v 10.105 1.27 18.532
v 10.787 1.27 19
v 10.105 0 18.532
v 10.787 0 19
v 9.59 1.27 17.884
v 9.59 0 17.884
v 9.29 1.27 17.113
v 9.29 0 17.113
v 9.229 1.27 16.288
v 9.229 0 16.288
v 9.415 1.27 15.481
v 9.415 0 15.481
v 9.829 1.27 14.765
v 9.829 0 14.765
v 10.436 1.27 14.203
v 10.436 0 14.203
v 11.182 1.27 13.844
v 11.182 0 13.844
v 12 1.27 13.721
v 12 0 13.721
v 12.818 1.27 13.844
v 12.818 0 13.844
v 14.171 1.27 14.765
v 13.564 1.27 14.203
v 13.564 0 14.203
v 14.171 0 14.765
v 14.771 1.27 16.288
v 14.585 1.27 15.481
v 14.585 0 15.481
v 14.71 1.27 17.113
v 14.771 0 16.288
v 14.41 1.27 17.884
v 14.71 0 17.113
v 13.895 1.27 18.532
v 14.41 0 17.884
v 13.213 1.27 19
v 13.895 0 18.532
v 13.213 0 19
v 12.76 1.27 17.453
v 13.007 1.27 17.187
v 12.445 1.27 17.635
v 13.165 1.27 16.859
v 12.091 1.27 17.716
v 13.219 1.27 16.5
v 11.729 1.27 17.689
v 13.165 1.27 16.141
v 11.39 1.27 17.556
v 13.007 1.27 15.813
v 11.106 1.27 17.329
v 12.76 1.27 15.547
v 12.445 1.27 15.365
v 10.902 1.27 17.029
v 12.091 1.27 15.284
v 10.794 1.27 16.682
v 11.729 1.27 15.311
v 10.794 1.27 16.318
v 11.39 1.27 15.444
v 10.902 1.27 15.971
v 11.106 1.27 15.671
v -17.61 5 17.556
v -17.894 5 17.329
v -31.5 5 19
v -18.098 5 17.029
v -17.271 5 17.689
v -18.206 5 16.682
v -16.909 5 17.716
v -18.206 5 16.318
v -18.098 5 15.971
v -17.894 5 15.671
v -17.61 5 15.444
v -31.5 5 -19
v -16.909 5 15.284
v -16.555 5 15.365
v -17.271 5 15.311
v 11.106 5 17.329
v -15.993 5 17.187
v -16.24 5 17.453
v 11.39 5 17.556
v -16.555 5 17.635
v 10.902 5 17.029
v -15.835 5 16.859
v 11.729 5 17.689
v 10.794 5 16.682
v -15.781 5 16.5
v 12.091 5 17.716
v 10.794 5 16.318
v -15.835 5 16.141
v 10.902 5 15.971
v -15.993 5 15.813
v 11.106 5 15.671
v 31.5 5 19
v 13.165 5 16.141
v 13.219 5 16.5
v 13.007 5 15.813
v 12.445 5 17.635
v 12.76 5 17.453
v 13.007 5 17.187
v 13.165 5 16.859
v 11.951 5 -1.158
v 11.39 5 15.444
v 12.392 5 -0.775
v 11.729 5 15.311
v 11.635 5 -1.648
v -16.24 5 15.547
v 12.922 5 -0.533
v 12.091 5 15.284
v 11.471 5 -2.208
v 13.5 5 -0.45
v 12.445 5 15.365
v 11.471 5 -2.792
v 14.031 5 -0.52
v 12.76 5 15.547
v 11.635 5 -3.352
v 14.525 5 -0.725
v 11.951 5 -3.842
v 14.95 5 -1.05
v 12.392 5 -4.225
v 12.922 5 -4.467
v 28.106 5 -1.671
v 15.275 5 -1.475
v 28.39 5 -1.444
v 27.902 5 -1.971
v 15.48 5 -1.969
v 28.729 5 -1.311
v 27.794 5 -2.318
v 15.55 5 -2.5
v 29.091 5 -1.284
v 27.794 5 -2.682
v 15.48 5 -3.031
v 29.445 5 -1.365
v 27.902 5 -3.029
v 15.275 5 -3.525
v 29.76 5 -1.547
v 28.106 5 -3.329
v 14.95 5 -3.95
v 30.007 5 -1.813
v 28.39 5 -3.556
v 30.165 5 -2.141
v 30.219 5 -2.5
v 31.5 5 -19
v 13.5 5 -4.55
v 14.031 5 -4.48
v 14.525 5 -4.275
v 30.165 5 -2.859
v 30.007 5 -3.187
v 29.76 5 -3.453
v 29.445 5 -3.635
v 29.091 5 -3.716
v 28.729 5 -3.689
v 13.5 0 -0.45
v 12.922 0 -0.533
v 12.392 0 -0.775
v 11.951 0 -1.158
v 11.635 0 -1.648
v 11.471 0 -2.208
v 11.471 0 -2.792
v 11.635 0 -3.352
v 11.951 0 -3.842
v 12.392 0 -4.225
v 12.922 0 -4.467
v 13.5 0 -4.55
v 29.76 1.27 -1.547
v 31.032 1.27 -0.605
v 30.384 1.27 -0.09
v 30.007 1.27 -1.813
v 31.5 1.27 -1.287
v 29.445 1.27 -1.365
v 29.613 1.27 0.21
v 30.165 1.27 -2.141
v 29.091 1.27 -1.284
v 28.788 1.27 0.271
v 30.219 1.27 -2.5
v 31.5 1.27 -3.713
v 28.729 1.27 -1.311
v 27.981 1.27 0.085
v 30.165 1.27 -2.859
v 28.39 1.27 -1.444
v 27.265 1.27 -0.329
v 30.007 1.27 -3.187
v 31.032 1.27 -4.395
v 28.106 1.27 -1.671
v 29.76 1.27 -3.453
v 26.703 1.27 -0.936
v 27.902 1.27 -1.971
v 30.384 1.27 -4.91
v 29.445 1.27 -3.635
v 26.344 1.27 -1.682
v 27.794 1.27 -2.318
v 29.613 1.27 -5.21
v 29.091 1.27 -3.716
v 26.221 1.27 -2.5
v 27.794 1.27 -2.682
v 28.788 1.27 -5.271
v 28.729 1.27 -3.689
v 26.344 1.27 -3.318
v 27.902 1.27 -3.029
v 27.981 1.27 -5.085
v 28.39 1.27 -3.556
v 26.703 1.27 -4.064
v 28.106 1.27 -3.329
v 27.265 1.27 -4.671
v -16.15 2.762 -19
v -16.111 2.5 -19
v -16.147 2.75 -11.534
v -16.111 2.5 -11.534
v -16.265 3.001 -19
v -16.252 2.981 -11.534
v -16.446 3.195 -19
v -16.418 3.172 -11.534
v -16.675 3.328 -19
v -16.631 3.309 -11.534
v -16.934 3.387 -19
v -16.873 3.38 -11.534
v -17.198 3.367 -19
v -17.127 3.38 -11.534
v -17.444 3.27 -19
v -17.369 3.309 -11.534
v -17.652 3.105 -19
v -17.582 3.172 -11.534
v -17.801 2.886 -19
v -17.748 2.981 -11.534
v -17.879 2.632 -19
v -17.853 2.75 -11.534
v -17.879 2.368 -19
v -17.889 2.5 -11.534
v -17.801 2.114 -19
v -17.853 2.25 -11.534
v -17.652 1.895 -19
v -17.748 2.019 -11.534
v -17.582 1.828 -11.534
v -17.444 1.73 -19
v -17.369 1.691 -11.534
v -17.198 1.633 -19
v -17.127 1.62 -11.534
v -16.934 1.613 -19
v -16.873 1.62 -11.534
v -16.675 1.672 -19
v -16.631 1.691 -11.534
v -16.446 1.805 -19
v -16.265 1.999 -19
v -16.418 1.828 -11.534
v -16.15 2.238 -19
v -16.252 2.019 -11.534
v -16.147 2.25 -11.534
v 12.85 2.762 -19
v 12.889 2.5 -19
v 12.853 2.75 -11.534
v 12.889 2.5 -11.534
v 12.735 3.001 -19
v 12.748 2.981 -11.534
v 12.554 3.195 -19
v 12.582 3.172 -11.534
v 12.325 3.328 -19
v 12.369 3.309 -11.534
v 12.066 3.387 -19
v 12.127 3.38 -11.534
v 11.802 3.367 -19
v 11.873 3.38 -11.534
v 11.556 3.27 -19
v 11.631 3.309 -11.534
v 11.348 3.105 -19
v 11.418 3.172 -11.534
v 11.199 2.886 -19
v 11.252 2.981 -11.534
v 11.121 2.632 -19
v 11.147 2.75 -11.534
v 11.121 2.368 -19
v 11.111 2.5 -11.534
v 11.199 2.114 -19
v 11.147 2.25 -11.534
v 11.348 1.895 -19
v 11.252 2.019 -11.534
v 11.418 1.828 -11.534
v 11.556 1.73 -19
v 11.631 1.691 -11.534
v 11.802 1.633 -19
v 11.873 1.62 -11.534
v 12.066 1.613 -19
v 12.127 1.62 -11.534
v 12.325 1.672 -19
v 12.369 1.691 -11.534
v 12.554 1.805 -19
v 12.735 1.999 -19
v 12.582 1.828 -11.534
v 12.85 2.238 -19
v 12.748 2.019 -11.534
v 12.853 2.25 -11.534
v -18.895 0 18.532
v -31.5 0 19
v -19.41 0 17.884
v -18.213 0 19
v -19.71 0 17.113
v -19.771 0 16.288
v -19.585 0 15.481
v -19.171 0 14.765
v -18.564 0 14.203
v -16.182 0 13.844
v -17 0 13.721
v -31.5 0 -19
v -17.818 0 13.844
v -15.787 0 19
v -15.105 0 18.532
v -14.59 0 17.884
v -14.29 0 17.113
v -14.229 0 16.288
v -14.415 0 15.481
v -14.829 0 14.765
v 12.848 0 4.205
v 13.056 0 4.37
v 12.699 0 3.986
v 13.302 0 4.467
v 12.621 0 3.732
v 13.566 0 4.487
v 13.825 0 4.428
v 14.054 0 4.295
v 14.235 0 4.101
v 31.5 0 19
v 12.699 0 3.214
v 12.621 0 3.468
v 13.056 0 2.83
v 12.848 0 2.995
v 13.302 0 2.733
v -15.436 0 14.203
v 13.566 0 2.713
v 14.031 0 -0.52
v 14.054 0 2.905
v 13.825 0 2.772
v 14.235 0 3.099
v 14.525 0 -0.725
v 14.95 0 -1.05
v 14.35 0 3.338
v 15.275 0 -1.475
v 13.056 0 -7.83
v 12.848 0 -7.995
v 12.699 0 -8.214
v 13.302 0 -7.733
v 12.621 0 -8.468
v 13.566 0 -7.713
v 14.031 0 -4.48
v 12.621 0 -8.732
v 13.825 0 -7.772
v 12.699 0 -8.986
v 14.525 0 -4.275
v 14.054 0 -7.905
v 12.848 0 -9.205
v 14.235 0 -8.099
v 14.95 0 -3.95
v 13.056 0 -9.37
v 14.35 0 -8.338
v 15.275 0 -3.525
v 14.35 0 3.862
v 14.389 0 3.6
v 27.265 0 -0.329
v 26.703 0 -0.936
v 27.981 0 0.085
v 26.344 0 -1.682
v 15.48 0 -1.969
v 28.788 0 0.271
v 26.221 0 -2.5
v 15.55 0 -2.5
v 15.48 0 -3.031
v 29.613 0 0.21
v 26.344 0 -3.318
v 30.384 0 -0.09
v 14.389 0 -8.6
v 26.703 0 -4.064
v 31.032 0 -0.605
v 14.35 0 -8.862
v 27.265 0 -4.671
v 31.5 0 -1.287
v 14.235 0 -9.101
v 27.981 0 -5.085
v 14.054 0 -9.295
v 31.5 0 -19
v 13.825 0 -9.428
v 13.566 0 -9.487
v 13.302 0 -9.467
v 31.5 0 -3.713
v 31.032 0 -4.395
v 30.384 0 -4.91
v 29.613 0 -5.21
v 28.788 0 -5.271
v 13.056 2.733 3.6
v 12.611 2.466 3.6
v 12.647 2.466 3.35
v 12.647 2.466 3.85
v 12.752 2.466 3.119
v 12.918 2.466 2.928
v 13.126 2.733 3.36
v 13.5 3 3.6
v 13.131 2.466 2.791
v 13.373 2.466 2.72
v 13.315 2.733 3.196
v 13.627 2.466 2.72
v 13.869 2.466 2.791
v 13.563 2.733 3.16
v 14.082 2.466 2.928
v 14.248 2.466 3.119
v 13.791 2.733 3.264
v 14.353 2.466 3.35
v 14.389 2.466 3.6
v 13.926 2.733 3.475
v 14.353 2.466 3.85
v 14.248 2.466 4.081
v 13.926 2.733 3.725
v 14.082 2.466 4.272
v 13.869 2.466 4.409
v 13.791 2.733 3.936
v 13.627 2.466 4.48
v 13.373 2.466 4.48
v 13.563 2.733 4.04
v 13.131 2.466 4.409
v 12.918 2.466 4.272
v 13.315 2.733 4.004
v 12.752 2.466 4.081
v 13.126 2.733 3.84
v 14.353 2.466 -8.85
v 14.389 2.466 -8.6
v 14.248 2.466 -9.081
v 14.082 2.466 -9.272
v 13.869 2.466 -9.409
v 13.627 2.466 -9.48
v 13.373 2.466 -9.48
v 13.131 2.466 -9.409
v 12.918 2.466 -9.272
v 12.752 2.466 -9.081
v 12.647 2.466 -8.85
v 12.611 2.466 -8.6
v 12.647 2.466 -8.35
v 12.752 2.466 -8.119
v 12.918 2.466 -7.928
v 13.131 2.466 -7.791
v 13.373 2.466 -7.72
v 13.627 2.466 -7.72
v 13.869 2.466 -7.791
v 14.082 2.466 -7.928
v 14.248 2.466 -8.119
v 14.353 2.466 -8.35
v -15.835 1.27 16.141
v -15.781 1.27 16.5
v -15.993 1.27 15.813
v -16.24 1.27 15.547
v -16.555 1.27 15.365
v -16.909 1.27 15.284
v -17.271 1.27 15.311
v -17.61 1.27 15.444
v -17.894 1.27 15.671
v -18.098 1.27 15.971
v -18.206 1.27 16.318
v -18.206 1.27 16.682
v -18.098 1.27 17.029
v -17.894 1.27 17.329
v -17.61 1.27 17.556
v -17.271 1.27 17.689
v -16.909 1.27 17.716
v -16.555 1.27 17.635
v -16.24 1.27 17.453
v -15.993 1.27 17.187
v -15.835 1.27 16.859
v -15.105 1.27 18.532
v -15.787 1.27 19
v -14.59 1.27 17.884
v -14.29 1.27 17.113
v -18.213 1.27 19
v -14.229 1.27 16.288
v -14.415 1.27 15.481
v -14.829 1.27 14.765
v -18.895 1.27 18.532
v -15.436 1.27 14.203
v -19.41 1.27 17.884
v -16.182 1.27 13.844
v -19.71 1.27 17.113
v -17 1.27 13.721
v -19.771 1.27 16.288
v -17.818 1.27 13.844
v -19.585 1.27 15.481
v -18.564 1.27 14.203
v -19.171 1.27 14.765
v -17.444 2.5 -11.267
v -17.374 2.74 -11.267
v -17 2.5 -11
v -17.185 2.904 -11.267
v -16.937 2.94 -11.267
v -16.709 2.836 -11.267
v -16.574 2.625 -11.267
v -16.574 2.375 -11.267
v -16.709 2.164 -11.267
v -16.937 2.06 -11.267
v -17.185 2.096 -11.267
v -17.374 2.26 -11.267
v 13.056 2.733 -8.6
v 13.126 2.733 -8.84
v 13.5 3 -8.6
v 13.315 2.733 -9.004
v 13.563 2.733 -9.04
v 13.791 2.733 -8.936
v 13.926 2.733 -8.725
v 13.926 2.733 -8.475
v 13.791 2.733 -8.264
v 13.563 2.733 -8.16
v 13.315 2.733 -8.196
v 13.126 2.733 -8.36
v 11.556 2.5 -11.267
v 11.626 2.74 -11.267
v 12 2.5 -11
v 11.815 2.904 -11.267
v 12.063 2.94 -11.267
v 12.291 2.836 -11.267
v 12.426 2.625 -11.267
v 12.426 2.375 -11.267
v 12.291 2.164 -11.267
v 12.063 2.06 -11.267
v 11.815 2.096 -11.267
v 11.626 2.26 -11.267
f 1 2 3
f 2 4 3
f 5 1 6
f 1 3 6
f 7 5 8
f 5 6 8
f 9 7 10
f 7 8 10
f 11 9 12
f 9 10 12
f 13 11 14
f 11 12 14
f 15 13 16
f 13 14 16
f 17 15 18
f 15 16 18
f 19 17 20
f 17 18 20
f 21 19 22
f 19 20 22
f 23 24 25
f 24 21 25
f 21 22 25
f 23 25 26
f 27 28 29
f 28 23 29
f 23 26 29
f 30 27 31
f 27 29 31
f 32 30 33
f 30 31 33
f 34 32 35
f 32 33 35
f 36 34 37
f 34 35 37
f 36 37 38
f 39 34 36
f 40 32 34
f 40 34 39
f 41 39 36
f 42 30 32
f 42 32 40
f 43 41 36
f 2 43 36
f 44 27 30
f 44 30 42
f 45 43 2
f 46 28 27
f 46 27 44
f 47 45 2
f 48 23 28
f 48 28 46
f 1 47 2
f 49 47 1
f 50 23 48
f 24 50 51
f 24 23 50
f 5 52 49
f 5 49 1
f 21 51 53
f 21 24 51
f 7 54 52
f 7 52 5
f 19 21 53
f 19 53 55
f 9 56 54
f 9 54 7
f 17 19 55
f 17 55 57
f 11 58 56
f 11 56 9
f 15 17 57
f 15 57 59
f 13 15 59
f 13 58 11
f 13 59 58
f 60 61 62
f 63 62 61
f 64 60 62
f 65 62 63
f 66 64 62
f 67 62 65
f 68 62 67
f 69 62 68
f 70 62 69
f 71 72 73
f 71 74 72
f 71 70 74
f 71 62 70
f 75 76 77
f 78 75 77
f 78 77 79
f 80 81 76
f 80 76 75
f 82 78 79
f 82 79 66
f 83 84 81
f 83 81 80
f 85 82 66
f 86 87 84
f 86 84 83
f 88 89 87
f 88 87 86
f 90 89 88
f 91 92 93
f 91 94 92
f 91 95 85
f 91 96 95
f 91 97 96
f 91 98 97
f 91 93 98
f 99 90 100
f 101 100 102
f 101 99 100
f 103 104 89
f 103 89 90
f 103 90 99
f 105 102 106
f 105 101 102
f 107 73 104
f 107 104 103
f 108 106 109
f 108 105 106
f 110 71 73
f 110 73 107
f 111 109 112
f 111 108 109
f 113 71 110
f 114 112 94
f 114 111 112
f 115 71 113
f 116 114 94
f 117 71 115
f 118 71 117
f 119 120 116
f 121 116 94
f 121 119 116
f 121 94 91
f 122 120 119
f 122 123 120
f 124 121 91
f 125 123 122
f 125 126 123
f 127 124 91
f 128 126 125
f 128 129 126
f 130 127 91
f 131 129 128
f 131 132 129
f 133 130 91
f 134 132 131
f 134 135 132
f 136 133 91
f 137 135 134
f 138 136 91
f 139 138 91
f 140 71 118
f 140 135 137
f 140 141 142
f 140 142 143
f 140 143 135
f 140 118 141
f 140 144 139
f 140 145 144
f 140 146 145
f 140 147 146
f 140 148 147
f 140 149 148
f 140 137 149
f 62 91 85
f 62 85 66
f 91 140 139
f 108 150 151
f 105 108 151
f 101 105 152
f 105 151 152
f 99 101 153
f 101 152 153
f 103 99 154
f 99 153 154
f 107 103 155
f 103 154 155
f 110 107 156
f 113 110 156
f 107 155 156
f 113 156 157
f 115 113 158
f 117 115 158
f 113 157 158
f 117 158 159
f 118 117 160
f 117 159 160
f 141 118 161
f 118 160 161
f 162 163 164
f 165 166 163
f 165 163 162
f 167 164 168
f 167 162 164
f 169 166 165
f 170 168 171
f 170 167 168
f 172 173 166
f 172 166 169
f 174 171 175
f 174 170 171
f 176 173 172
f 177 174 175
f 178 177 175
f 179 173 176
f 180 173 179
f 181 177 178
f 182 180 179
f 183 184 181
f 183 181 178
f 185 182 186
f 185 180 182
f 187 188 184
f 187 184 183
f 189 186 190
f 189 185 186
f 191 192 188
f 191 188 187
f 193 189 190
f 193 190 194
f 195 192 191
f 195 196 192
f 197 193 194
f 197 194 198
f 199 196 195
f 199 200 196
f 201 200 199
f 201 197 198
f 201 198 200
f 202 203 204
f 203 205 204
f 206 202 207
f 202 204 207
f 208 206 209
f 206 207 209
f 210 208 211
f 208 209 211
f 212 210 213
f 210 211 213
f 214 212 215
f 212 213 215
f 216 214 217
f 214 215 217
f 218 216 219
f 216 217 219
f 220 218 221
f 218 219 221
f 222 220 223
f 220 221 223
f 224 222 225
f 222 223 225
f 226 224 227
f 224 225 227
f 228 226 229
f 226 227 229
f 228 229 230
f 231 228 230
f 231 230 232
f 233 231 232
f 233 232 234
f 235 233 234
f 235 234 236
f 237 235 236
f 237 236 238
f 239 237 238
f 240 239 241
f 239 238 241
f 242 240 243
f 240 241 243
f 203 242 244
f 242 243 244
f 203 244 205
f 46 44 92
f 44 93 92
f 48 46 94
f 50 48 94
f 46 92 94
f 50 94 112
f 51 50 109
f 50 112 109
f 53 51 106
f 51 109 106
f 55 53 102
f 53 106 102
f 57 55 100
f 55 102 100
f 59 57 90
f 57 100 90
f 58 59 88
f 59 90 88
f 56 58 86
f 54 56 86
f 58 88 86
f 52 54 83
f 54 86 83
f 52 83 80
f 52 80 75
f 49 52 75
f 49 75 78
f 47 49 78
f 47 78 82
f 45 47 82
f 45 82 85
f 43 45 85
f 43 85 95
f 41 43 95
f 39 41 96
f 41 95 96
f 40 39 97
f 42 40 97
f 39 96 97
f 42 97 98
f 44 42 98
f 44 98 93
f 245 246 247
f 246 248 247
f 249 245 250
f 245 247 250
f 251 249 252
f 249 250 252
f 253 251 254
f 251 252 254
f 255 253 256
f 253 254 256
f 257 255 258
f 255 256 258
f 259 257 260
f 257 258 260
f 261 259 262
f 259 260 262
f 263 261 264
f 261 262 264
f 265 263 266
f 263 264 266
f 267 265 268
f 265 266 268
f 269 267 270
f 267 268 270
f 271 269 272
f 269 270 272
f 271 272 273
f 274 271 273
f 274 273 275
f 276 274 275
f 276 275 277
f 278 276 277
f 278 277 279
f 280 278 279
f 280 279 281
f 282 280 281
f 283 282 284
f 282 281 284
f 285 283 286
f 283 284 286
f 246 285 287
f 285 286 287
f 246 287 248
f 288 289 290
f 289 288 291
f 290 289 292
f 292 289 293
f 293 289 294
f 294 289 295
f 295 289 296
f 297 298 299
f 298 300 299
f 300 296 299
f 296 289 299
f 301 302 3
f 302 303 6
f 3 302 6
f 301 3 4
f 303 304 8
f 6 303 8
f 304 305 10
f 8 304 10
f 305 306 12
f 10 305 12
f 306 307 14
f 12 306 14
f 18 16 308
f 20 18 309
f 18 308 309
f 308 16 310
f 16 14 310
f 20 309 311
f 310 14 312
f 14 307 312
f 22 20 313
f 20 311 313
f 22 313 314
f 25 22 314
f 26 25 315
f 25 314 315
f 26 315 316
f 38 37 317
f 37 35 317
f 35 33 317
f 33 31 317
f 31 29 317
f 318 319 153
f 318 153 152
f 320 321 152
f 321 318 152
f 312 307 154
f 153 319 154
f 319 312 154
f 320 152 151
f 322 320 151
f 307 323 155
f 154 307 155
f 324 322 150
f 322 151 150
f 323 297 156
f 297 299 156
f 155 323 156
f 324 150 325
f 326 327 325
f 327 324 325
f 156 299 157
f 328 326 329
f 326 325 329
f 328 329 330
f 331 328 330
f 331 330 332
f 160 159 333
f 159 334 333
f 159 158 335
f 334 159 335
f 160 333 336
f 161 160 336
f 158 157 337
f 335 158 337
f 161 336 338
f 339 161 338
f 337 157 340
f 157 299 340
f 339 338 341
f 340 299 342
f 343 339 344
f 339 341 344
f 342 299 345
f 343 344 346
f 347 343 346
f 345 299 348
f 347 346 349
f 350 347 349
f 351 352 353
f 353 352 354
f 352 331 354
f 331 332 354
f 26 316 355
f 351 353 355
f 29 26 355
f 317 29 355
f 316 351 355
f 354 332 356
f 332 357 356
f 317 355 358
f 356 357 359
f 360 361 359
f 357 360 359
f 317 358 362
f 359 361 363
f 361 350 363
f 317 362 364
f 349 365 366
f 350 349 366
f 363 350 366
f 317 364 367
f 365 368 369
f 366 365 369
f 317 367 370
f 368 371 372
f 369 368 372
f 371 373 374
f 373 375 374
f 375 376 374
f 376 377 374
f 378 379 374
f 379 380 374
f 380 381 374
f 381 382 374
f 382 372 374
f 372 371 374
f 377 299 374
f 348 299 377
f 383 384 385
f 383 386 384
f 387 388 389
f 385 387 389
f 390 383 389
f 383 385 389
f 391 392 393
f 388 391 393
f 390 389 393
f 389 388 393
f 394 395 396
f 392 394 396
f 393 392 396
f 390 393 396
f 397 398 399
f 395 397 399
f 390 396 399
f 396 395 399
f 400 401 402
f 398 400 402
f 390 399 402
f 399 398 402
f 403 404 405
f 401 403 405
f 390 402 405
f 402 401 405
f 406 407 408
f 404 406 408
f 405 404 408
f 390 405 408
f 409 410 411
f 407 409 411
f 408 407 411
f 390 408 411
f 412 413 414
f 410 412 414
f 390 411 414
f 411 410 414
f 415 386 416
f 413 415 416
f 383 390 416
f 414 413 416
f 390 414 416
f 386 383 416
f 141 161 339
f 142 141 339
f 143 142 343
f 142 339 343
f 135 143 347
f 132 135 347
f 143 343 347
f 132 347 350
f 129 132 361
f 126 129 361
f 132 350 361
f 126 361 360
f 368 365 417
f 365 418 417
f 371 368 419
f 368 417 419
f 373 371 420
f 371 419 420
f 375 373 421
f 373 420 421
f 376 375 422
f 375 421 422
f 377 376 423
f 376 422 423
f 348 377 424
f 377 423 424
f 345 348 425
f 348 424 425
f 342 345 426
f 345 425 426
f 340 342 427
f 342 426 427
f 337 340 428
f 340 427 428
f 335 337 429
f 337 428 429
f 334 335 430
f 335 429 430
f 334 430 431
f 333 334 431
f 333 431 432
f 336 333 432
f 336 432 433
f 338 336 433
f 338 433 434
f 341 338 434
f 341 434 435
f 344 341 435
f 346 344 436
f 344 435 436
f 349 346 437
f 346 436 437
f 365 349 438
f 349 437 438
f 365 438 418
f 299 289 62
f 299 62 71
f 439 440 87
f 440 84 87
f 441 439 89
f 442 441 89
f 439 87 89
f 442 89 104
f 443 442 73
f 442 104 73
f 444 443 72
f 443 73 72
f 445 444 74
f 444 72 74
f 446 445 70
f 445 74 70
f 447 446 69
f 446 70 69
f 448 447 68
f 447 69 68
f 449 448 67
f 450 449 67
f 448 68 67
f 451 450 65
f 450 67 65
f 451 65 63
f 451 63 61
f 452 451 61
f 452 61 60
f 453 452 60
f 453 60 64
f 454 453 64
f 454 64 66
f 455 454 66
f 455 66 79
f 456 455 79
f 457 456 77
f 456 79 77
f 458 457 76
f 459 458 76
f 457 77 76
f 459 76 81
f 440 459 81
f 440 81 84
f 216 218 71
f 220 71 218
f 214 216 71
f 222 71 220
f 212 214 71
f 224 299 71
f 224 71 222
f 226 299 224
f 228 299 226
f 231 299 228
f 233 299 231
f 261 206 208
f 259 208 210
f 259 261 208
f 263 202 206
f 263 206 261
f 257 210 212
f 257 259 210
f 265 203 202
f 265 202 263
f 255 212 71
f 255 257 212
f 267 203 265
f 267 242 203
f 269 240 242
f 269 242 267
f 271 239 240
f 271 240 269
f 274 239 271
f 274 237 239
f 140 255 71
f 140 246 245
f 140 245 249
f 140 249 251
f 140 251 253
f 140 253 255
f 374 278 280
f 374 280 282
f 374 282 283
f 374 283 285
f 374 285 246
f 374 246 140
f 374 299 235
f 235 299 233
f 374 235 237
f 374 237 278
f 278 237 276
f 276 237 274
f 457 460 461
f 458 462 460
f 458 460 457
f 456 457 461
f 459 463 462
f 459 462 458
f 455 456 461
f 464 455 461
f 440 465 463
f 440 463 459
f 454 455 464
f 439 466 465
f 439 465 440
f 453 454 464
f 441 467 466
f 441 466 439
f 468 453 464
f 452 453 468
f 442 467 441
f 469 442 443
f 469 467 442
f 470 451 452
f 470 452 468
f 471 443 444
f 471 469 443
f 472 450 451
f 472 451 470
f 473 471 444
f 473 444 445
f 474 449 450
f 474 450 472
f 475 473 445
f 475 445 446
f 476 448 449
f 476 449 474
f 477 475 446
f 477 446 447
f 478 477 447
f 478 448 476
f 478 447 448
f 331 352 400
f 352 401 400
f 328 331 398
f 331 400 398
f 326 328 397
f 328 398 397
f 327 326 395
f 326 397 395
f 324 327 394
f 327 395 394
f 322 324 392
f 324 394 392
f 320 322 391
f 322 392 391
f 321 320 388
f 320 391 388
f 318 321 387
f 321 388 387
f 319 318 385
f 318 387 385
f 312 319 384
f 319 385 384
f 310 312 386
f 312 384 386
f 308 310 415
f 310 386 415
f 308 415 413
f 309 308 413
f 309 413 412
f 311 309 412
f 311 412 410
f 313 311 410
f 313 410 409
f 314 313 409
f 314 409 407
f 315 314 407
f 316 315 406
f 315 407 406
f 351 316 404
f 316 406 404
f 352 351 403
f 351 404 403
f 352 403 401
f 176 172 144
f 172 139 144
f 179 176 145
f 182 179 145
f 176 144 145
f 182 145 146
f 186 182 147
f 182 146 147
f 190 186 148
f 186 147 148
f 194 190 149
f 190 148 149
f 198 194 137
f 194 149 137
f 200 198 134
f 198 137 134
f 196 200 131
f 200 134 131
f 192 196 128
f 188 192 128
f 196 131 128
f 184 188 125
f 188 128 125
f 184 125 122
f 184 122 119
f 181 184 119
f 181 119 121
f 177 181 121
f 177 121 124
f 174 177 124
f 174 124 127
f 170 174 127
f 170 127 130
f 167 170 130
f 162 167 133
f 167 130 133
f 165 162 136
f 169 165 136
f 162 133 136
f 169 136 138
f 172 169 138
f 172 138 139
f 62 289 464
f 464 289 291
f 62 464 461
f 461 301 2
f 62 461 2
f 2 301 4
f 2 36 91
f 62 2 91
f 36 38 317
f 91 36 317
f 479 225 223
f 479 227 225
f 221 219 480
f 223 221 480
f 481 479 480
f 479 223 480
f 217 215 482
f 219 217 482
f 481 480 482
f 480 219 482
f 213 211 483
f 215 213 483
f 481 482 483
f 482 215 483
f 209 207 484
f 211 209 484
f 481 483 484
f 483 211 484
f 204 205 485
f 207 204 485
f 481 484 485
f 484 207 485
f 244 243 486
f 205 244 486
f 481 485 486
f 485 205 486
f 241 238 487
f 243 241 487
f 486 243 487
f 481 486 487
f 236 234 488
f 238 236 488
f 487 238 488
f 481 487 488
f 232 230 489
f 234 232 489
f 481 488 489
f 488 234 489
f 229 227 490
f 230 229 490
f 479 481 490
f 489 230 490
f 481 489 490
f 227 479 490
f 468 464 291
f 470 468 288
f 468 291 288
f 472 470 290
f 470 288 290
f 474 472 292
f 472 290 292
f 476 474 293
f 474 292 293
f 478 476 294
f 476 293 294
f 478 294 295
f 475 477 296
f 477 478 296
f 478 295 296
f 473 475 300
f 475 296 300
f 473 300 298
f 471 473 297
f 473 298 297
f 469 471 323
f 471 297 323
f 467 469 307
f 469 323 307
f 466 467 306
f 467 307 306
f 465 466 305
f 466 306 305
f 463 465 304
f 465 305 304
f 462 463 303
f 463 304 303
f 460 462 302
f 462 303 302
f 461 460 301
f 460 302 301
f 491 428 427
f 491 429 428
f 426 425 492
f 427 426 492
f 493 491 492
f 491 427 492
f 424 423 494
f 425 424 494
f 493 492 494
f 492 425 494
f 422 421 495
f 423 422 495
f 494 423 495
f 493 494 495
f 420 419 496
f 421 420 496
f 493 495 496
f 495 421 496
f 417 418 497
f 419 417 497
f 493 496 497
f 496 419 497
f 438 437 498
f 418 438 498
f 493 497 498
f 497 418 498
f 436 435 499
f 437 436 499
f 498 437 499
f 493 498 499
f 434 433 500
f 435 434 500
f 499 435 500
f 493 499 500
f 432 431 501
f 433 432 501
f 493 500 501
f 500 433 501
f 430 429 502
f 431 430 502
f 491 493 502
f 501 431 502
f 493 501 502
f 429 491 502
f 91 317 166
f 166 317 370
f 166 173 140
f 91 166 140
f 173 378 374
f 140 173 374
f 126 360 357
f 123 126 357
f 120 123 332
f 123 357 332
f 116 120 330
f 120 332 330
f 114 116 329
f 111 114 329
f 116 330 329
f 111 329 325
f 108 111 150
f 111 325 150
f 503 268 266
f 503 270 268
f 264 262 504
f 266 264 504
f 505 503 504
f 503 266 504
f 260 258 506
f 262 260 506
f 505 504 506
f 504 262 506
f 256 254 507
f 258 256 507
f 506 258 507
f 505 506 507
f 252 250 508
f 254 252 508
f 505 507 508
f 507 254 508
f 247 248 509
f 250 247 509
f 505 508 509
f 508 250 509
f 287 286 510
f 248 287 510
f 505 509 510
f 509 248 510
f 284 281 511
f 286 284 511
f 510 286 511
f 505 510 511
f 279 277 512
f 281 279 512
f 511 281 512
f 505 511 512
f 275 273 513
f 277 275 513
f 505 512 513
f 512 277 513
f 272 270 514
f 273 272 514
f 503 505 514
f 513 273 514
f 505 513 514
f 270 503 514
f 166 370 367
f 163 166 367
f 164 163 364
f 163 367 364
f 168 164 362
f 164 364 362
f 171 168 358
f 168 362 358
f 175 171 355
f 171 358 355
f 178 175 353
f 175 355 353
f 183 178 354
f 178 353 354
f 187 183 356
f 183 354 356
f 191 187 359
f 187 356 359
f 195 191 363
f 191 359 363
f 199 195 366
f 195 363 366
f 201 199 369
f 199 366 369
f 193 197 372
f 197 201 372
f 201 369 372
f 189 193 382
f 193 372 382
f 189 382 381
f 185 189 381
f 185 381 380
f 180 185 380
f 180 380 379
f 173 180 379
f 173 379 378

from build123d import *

# Parameters (mm, degrees)
SKETCH1_W                                           = 63
SKETCH1_H                                           = 38
BOSS_EXTRUDE1_DEPTH                                 = 5
CBORE_FOR_2_BINDING_HEAD_MACHINE_SCREW2_D           = 2.4384
CBORE_FOR_2_BINDING_HEAD_MACHINE_SCREW2_CBORE_D     = 5.55752
CBORE_FOR_2_BINDING_HEAD_MACHINE_SCREW2_CBORE_DEPTH = 1.27
CBORE_FOR_2_BINDING_HEAD_MACHINE_SCREW3_D           = 2.4384
CBORE_FOR_2_BINDING_HEAD_MACHINE_SCREW3_CBORE_D     = 5.55752
CBORE_FOR_2_BINDING_HEAD_MACHINE_SCREW3_CBORE_DEPTH = 1.27
CUT_EXTRUDE1_DEPTH                                  = 10
F_2_56_TAPPED_HOLE2_D                               = 1.778
F_2_56_TAPPED_HOLE2_DEPTH                           = 2.46583491
F_2_56_TAPPED_HOLE2_TIP                             = 0.53416509
F_2_56_TAPPED_HOLE3_D                               = 1.778
F_2_56_TAPPED_HOLE3_DEPTH                           = 7.46583491
F_2_56_TAPPED_HOLE3_TIP                             = 0.53416509


with BuildPart() as part:
    # Sketch1 → Boss-Extrude1 (new body)
    with BuildSketch(Plane(origin=(0, 0, 0), x_dir=(1, 0, 0), z_dir=(0, 1, 0))):
        Rectangle(SKETCH1_W, SKETCH1_H)
    extrude(amount=BOSS_EXTRUDE1_DEPTH)

    # CBORE for #2 Binding Head Machine Screw2 (through all)
    with Locations(Plane(origin=(0, 0, 0), x_dir=(-1, 0, 0), z_dir=(0, -1, 0))):
        with Locations((-29, 2.5)):
            CounterBoreHole(CBORE_FOR_2_BINDING_HEAD_MACHINE_SCREW2_D / 2, CBORE_FOR_2_BINDING_HEAD_MACHINE_SCREW2_CBORE_D / 2, CBORE_FOR_2_BINDING_HEAD_MACHINE_SCREW2_CBORE_DEPTH)

    # CBORE for #2 Binding Head Machine Screw3 (through all)
    with Locations(Plane(origin=(0, 0, 0), x_dir=(-1, 0, 0), z_dir=(0, -1, 0))):
        with Locations((-12, -16.5), (17, -16.5)):
            CounterBoreHole(CBORE_FOR_2_BINDING_HEAD_MACHINE_SCREW3_D / 2, CBORE_FOR_2_BINDING_HEAD_MACHINE_SCREW3_CBORE_D / 2, CBORE_FOR_2_BINDING_HEAD_MACHINE_SCREW3_CBORE_DEPTH)

    # Sketch17 → Cut-Extrude1 (cut)
    with BuildSketch(Plane.XZ):
        with BuildLine():
            ThreePointArc((15.55, -2.5), (14.949568901, -1.050431099), (13.5, -0.45))
            Line((13.5, -0.45), (13.5, -2.5))
            Line((13.5, -2.5), (13.5, -4.55))
            ThreePointArc((13.5, -4.55), (14.949568901, -3.949568901), (15.55, -2.5))
        make_face()
        with BuildLine():
            Line((13.5, -2.5), (13.5, -0.45))
            ThreePointArc((13.5, -0.45), (11.45, -2.5), (13.5, -4.55))
            Line((13.5, -4.55), (13.5, -2.5))
        make_face()
    extrude(amount=-CUT_EXTRUDE1_DEPTH, mode=Mode.SUBTRACT)

    # #2-56 Tapped Hole2
    with Locations(Plane(origin=(0, 0, 0), x_dir=(-1, 0, 0), z_dir=(0, -1, 0))):
        with Locations((-13.5, 8.6), (-13.5, -3.6)):
            Hole(F_2_56_TAPPED_HOLE2_D / 2, depth=F_2_56_TAPPED_HOLE2_DEPTH)
            with Locations((0, 0, -(F_2_56_TAPPED_HOLE2_DEPTH + F_2_56_TAPPED_HOLE2_TIP / 2))):  # 118° drill point
                Cone(0, F_2_56_TAPPED_HOLE2_D / 2, F_2_56_TAPPED_HOLE2_TIP, mode=Mode.SUBTRACT)

    # #2-56 Tapped Hole3
    with Locations(Plane(origin=(0, 0, -19), x_dir=(-1, 0, 0), z_dir=(0, 0, -1))):
        with Locations((-12, 2.5), (17, 2.5)):
            Hole(F_2_56_TAPPED_HOLE3_D / 2, depth=F_2_56_TAPPED_HOLE3_DEPTH)
            with Locations((0, 0, -(F_2_56_TAPPED_HOLE3_DEPTH + F_2_56_TAPPED_HOLE3_TIP / 2))):  # 118° drill point
                Cone(0, F_2_56_TAPPED_HOLE3_D / 2, F_2_56_TAPPED_HOLE3_TIP, mode=Mode.SUBTRACT)


solid = part.part
